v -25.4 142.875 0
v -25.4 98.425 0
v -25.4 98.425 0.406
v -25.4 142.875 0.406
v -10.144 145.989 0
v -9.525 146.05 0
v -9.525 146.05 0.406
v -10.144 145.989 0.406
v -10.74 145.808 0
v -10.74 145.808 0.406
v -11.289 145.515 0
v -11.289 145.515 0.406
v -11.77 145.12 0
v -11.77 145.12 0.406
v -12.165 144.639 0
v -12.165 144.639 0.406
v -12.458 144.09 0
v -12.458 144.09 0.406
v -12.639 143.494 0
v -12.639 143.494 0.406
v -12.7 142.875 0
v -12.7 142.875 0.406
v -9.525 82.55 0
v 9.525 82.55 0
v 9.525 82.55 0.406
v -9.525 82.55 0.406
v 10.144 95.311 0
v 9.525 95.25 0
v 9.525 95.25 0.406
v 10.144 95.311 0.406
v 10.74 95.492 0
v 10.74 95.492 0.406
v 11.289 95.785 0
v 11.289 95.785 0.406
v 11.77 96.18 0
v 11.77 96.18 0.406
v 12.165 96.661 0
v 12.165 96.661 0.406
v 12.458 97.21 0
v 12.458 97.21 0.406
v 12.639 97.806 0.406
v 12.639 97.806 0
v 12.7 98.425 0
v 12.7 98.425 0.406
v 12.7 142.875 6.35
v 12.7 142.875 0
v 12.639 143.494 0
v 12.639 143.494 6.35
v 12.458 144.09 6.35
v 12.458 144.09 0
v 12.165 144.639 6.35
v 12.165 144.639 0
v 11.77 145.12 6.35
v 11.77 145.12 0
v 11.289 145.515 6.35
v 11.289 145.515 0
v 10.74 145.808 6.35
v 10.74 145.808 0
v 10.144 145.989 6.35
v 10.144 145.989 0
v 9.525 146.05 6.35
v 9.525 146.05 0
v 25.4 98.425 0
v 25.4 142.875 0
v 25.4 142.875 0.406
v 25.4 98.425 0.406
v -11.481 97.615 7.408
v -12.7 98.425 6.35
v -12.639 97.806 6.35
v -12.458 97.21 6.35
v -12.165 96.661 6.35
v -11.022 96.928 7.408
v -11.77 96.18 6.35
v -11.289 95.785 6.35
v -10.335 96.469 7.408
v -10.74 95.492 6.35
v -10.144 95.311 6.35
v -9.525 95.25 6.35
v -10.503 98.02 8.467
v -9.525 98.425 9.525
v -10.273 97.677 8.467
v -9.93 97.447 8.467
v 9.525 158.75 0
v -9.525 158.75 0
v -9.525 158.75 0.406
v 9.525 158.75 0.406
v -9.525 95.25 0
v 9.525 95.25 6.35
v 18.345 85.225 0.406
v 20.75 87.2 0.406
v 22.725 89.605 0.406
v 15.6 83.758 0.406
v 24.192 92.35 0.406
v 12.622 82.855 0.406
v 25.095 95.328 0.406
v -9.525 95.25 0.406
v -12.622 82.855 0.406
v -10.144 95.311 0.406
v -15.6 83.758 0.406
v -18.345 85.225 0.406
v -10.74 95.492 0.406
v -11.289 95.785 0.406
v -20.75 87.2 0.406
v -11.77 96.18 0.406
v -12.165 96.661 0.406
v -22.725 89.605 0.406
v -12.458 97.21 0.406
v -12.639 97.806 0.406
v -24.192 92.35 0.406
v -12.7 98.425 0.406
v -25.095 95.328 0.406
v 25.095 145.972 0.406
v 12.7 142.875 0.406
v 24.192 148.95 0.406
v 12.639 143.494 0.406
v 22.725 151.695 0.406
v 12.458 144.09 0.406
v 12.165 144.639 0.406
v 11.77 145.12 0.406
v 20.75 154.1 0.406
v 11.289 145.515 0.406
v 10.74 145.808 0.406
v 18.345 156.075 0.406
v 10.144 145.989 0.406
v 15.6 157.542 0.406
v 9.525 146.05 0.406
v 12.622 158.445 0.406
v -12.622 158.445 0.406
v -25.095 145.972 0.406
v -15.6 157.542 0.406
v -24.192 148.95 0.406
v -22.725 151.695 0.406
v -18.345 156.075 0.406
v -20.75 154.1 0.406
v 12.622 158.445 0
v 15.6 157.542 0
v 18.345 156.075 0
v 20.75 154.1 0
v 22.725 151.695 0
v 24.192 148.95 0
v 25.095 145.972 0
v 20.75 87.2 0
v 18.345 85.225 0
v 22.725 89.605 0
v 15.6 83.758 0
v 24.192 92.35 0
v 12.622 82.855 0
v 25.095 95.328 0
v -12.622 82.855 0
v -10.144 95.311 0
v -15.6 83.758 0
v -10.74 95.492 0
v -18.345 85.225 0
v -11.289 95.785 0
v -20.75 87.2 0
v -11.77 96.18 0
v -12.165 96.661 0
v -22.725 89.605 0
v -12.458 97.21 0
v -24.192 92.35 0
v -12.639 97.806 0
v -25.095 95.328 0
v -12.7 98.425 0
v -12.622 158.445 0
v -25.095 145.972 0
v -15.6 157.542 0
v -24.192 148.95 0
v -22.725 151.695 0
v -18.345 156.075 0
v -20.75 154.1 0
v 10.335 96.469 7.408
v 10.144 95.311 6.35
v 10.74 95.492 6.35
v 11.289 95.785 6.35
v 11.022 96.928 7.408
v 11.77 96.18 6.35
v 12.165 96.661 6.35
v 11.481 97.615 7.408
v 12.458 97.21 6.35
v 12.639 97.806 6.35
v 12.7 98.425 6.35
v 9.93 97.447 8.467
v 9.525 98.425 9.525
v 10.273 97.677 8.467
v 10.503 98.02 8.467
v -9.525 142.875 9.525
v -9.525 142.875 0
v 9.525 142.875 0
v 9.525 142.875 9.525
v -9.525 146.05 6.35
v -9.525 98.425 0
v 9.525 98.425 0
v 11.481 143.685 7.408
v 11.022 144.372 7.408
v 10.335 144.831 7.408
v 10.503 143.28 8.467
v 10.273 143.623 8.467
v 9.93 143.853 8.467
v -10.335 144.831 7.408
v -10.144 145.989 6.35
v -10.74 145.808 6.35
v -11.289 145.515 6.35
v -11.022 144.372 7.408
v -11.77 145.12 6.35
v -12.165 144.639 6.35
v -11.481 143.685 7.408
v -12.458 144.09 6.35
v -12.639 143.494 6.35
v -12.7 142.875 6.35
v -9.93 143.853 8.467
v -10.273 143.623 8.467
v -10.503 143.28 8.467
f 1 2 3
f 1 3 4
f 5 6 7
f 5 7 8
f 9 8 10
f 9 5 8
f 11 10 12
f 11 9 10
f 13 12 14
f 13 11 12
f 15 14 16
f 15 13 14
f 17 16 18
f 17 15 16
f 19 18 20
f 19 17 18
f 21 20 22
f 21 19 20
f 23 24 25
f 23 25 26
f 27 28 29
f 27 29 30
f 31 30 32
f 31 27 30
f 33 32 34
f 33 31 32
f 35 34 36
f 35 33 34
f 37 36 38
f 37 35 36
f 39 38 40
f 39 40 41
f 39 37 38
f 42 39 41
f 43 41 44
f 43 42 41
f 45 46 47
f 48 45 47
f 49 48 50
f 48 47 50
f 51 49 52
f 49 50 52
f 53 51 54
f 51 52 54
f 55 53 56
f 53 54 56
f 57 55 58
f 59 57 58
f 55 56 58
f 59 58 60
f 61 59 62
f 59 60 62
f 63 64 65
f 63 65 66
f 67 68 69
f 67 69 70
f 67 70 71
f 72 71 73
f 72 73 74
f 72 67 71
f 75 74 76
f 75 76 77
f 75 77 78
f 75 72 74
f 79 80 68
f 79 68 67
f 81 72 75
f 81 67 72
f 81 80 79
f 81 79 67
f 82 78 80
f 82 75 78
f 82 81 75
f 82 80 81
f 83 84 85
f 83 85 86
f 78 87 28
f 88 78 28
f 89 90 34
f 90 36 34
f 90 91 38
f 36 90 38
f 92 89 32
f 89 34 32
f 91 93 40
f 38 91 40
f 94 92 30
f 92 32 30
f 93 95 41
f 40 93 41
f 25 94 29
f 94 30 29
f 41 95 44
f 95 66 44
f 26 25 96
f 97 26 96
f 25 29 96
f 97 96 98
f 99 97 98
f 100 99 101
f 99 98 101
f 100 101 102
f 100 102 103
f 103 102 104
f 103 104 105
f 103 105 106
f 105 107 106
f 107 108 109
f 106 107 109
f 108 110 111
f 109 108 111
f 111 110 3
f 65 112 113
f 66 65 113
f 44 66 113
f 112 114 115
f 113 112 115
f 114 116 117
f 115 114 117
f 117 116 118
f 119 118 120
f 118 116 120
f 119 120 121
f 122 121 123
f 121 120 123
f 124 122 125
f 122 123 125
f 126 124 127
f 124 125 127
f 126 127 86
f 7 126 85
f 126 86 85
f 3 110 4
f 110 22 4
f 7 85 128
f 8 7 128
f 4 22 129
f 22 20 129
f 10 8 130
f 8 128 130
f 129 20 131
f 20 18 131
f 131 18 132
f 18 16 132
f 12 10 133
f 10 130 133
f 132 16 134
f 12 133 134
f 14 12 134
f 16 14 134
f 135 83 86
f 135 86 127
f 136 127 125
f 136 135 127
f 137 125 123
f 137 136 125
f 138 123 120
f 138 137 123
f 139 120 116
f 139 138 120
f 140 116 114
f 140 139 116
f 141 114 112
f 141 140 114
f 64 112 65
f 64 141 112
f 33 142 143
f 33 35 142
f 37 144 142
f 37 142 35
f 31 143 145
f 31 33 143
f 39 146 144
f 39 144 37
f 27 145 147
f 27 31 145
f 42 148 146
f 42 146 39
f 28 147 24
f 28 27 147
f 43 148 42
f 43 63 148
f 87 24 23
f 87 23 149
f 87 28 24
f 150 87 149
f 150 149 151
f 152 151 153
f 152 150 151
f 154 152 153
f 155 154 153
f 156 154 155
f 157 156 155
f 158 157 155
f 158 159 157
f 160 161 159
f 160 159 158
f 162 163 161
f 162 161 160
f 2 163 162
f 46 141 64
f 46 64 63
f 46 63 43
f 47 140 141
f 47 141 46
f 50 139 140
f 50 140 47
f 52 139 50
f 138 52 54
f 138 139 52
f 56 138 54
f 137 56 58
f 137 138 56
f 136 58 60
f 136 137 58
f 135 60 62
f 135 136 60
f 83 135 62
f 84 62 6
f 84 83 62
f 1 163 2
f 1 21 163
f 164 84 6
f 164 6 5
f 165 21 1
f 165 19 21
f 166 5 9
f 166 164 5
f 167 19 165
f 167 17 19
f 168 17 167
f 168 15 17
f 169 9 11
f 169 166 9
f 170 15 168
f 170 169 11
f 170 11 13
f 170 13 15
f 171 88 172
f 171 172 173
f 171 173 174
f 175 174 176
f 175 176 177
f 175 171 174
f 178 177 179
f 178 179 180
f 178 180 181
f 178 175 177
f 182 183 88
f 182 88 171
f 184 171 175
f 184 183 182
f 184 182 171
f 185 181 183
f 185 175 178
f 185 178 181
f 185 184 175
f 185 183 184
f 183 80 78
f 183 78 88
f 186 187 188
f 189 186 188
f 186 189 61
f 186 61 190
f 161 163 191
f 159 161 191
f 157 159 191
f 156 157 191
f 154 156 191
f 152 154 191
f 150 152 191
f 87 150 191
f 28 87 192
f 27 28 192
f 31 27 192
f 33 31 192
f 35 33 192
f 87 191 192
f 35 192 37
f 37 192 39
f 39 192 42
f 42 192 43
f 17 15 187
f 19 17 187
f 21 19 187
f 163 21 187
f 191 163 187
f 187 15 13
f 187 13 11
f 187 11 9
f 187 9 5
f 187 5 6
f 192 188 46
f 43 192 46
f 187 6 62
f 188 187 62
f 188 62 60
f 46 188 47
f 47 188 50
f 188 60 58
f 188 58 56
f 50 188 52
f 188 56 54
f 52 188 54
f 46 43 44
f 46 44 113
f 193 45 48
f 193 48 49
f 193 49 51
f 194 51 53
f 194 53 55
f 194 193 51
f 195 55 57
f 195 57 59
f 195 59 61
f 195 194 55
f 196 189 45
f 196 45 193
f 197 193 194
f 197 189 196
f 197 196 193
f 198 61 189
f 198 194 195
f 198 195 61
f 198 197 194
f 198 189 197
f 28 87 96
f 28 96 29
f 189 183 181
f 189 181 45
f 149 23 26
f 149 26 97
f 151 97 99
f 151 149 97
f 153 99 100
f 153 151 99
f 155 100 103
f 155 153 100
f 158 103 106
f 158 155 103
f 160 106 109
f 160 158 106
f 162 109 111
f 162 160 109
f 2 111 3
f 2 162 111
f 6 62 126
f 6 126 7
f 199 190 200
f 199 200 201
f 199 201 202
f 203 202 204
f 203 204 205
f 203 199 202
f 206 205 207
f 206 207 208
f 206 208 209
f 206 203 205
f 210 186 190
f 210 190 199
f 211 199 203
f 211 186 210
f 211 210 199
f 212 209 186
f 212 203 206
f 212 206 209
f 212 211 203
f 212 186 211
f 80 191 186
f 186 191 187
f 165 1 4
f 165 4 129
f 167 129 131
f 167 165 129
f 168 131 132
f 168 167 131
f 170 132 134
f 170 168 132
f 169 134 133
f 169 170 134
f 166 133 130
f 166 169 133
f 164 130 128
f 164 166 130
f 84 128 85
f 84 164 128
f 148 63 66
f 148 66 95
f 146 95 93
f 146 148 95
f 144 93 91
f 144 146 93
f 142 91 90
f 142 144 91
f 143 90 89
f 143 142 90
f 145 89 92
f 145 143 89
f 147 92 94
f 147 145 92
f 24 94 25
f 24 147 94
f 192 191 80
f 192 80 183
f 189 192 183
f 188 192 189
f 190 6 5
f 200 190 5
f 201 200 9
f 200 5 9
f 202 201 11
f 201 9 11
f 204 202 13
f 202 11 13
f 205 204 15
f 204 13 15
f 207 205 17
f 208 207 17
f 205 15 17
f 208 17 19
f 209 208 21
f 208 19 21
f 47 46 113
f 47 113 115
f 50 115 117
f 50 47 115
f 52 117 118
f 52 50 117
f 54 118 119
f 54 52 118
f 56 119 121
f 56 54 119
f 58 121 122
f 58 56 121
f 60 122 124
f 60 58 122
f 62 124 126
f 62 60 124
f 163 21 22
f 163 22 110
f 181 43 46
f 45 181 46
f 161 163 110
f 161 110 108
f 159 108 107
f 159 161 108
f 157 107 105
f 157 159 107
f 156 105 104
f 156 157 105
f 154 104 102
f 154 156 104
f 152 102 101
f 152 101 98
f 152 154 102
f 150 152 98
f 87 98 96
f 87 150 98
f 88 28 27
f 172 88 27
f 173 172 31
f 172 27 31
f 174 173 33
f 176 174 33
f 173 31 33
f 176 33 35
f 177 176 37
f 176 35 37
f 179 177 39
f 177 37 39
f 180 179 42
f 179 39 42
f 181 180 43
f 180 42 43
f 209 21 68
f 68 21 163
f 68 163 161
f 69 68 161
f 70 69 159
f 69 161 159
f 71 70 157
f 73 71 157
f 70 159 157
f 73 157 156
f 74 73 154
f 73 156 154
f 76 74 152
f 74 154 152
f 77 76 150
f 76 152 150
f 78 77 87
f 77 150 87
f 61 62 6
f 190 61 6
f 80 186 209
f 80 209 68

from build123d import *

# Parameters (mm, degrees)
BOSS_EXTRUDE1_DEPTH = 0.4064
SKETCH3_W           = 19.05
SKETCH3_H           = 44.45
BOSS_EXTRUDE5_DEPTH = 9.525
CHAMFER1_SIZE       = 3.175


with BuildPart() as part:
    # Sketch2 → Boss-Extrude1 (new body)
    with BuildSketch(Plane.XY):
        with BuildLine():
            Line((-9.525, 158.75), (9.525, 158.75))
            ThreePointArc((9.525, 158.75), (20.750320151, 154.100320151), (25.4, 142.875))
            Line((25.4, 142.875), (25.4, 98.425))
            ThreePointArc((25.4, 98.425), (20.750320151, 87.199679849), (9.525, 82.55))
            Line((9.525, 82.55), (-9.525, 82.55))
            ThreePointArc((-9.525, 82.55), (-20.750320151, 87.199679849), (-25.4, 98.425))
            Line((-25.4, 98.425), (-25.4, 142.875))
            ThreePointArc((-25.4, 142.875), (-20.750320151, 154.100320151), (-9.525, 158.75))
        make_face()
        with BuildLine():
            Line((-9.525, 95.25), (9.525, 95.25))
            ThreePointArc((9.525, 95.25), (11.77006403, 96.17993597), (12.7, 98.425))
            Line((12.7, 98.425), (12.7, 142.875))
            ThreePointArc((12.7, 142.875), (11.77006403, 145.12006403), (9.525, 146.05))
            Line((9.525, 146.05), (-9.525, 146.05))
            ThreePointArc((-9.525, 146.05), (-11.77006403, 145.12006403), (-12.7, 142.875))
            Line((-12.7, 142.875), (-12.7, 98.425))
            ThreePointArc((-12.7, 98.425), (-11.77006403, 96.17993597), (-9.525, 95.25))
        make_face(mode=Mode.SUBTRACT)
    extrude(amount=BOSS_EXTRUDE1_DEPTH)


with BuildPart() as body_2:
    # Sketch3 → Boss-Extrude5 (new body)
    with BuildSketch(Plane.XY):
        with BuildLine():
            Line((-9.525, 95.25), (9.525, 95.25))
            ThreePointArc((9.525, 95.25), (11.77006403, 96.17993597), (12.7, 98.425))
            Line((12.7, 98.425), (12.7, 142.875))
            ThreePointArc((12.7, 142.875), (11.77006403, 145.12006403), (9.525, 146.05))
            Line((9.525, 146.05), (-9.525, 146.05))
            ThreePointArc((-9.525, 146.05), (-11.77006403, 145.12006403), (-12.7, 142.875))
            Line((-12.7, 142.875), (-12.7, 98.425))
            ThreePointArc((-12.7, 98.425), (-11.77006403, 96.17993597), (-9.525, 95.25))
        make_face()
        with Locations((0, 120.65)):
            Rectangle(SKETCH3_W, SKETCH3_H, mode=Mode.SUBTRACT)
    extrude(amount=BOSS_EXTRUDE5_DEPTH)

    # Chamfer1
    chamfer1_edges = [body_2.edges().sort_by_distance(p)[0] for p in [
        (0, 146.05, 9.525),
        (-11.77006403, 145.12006403, 9.525),
        (-12.7, 120.65, 9.525),
        (-11.77006403, 96.17993597, 9.525),
        (0, 95.25, 9.525),
        (11.77006403, 96.17993597, 9.525),
        (12.7, 120.65, 9.525),
        (11.77006403, 145.12006403, 9.525),
    ]]
    chamfer(chamfer1_edges, length=CHAMFER1_SIZE - 0.0001)  # a hair under: the kernel refuses the full size


solid = Compound([part.part, body_2.part])
